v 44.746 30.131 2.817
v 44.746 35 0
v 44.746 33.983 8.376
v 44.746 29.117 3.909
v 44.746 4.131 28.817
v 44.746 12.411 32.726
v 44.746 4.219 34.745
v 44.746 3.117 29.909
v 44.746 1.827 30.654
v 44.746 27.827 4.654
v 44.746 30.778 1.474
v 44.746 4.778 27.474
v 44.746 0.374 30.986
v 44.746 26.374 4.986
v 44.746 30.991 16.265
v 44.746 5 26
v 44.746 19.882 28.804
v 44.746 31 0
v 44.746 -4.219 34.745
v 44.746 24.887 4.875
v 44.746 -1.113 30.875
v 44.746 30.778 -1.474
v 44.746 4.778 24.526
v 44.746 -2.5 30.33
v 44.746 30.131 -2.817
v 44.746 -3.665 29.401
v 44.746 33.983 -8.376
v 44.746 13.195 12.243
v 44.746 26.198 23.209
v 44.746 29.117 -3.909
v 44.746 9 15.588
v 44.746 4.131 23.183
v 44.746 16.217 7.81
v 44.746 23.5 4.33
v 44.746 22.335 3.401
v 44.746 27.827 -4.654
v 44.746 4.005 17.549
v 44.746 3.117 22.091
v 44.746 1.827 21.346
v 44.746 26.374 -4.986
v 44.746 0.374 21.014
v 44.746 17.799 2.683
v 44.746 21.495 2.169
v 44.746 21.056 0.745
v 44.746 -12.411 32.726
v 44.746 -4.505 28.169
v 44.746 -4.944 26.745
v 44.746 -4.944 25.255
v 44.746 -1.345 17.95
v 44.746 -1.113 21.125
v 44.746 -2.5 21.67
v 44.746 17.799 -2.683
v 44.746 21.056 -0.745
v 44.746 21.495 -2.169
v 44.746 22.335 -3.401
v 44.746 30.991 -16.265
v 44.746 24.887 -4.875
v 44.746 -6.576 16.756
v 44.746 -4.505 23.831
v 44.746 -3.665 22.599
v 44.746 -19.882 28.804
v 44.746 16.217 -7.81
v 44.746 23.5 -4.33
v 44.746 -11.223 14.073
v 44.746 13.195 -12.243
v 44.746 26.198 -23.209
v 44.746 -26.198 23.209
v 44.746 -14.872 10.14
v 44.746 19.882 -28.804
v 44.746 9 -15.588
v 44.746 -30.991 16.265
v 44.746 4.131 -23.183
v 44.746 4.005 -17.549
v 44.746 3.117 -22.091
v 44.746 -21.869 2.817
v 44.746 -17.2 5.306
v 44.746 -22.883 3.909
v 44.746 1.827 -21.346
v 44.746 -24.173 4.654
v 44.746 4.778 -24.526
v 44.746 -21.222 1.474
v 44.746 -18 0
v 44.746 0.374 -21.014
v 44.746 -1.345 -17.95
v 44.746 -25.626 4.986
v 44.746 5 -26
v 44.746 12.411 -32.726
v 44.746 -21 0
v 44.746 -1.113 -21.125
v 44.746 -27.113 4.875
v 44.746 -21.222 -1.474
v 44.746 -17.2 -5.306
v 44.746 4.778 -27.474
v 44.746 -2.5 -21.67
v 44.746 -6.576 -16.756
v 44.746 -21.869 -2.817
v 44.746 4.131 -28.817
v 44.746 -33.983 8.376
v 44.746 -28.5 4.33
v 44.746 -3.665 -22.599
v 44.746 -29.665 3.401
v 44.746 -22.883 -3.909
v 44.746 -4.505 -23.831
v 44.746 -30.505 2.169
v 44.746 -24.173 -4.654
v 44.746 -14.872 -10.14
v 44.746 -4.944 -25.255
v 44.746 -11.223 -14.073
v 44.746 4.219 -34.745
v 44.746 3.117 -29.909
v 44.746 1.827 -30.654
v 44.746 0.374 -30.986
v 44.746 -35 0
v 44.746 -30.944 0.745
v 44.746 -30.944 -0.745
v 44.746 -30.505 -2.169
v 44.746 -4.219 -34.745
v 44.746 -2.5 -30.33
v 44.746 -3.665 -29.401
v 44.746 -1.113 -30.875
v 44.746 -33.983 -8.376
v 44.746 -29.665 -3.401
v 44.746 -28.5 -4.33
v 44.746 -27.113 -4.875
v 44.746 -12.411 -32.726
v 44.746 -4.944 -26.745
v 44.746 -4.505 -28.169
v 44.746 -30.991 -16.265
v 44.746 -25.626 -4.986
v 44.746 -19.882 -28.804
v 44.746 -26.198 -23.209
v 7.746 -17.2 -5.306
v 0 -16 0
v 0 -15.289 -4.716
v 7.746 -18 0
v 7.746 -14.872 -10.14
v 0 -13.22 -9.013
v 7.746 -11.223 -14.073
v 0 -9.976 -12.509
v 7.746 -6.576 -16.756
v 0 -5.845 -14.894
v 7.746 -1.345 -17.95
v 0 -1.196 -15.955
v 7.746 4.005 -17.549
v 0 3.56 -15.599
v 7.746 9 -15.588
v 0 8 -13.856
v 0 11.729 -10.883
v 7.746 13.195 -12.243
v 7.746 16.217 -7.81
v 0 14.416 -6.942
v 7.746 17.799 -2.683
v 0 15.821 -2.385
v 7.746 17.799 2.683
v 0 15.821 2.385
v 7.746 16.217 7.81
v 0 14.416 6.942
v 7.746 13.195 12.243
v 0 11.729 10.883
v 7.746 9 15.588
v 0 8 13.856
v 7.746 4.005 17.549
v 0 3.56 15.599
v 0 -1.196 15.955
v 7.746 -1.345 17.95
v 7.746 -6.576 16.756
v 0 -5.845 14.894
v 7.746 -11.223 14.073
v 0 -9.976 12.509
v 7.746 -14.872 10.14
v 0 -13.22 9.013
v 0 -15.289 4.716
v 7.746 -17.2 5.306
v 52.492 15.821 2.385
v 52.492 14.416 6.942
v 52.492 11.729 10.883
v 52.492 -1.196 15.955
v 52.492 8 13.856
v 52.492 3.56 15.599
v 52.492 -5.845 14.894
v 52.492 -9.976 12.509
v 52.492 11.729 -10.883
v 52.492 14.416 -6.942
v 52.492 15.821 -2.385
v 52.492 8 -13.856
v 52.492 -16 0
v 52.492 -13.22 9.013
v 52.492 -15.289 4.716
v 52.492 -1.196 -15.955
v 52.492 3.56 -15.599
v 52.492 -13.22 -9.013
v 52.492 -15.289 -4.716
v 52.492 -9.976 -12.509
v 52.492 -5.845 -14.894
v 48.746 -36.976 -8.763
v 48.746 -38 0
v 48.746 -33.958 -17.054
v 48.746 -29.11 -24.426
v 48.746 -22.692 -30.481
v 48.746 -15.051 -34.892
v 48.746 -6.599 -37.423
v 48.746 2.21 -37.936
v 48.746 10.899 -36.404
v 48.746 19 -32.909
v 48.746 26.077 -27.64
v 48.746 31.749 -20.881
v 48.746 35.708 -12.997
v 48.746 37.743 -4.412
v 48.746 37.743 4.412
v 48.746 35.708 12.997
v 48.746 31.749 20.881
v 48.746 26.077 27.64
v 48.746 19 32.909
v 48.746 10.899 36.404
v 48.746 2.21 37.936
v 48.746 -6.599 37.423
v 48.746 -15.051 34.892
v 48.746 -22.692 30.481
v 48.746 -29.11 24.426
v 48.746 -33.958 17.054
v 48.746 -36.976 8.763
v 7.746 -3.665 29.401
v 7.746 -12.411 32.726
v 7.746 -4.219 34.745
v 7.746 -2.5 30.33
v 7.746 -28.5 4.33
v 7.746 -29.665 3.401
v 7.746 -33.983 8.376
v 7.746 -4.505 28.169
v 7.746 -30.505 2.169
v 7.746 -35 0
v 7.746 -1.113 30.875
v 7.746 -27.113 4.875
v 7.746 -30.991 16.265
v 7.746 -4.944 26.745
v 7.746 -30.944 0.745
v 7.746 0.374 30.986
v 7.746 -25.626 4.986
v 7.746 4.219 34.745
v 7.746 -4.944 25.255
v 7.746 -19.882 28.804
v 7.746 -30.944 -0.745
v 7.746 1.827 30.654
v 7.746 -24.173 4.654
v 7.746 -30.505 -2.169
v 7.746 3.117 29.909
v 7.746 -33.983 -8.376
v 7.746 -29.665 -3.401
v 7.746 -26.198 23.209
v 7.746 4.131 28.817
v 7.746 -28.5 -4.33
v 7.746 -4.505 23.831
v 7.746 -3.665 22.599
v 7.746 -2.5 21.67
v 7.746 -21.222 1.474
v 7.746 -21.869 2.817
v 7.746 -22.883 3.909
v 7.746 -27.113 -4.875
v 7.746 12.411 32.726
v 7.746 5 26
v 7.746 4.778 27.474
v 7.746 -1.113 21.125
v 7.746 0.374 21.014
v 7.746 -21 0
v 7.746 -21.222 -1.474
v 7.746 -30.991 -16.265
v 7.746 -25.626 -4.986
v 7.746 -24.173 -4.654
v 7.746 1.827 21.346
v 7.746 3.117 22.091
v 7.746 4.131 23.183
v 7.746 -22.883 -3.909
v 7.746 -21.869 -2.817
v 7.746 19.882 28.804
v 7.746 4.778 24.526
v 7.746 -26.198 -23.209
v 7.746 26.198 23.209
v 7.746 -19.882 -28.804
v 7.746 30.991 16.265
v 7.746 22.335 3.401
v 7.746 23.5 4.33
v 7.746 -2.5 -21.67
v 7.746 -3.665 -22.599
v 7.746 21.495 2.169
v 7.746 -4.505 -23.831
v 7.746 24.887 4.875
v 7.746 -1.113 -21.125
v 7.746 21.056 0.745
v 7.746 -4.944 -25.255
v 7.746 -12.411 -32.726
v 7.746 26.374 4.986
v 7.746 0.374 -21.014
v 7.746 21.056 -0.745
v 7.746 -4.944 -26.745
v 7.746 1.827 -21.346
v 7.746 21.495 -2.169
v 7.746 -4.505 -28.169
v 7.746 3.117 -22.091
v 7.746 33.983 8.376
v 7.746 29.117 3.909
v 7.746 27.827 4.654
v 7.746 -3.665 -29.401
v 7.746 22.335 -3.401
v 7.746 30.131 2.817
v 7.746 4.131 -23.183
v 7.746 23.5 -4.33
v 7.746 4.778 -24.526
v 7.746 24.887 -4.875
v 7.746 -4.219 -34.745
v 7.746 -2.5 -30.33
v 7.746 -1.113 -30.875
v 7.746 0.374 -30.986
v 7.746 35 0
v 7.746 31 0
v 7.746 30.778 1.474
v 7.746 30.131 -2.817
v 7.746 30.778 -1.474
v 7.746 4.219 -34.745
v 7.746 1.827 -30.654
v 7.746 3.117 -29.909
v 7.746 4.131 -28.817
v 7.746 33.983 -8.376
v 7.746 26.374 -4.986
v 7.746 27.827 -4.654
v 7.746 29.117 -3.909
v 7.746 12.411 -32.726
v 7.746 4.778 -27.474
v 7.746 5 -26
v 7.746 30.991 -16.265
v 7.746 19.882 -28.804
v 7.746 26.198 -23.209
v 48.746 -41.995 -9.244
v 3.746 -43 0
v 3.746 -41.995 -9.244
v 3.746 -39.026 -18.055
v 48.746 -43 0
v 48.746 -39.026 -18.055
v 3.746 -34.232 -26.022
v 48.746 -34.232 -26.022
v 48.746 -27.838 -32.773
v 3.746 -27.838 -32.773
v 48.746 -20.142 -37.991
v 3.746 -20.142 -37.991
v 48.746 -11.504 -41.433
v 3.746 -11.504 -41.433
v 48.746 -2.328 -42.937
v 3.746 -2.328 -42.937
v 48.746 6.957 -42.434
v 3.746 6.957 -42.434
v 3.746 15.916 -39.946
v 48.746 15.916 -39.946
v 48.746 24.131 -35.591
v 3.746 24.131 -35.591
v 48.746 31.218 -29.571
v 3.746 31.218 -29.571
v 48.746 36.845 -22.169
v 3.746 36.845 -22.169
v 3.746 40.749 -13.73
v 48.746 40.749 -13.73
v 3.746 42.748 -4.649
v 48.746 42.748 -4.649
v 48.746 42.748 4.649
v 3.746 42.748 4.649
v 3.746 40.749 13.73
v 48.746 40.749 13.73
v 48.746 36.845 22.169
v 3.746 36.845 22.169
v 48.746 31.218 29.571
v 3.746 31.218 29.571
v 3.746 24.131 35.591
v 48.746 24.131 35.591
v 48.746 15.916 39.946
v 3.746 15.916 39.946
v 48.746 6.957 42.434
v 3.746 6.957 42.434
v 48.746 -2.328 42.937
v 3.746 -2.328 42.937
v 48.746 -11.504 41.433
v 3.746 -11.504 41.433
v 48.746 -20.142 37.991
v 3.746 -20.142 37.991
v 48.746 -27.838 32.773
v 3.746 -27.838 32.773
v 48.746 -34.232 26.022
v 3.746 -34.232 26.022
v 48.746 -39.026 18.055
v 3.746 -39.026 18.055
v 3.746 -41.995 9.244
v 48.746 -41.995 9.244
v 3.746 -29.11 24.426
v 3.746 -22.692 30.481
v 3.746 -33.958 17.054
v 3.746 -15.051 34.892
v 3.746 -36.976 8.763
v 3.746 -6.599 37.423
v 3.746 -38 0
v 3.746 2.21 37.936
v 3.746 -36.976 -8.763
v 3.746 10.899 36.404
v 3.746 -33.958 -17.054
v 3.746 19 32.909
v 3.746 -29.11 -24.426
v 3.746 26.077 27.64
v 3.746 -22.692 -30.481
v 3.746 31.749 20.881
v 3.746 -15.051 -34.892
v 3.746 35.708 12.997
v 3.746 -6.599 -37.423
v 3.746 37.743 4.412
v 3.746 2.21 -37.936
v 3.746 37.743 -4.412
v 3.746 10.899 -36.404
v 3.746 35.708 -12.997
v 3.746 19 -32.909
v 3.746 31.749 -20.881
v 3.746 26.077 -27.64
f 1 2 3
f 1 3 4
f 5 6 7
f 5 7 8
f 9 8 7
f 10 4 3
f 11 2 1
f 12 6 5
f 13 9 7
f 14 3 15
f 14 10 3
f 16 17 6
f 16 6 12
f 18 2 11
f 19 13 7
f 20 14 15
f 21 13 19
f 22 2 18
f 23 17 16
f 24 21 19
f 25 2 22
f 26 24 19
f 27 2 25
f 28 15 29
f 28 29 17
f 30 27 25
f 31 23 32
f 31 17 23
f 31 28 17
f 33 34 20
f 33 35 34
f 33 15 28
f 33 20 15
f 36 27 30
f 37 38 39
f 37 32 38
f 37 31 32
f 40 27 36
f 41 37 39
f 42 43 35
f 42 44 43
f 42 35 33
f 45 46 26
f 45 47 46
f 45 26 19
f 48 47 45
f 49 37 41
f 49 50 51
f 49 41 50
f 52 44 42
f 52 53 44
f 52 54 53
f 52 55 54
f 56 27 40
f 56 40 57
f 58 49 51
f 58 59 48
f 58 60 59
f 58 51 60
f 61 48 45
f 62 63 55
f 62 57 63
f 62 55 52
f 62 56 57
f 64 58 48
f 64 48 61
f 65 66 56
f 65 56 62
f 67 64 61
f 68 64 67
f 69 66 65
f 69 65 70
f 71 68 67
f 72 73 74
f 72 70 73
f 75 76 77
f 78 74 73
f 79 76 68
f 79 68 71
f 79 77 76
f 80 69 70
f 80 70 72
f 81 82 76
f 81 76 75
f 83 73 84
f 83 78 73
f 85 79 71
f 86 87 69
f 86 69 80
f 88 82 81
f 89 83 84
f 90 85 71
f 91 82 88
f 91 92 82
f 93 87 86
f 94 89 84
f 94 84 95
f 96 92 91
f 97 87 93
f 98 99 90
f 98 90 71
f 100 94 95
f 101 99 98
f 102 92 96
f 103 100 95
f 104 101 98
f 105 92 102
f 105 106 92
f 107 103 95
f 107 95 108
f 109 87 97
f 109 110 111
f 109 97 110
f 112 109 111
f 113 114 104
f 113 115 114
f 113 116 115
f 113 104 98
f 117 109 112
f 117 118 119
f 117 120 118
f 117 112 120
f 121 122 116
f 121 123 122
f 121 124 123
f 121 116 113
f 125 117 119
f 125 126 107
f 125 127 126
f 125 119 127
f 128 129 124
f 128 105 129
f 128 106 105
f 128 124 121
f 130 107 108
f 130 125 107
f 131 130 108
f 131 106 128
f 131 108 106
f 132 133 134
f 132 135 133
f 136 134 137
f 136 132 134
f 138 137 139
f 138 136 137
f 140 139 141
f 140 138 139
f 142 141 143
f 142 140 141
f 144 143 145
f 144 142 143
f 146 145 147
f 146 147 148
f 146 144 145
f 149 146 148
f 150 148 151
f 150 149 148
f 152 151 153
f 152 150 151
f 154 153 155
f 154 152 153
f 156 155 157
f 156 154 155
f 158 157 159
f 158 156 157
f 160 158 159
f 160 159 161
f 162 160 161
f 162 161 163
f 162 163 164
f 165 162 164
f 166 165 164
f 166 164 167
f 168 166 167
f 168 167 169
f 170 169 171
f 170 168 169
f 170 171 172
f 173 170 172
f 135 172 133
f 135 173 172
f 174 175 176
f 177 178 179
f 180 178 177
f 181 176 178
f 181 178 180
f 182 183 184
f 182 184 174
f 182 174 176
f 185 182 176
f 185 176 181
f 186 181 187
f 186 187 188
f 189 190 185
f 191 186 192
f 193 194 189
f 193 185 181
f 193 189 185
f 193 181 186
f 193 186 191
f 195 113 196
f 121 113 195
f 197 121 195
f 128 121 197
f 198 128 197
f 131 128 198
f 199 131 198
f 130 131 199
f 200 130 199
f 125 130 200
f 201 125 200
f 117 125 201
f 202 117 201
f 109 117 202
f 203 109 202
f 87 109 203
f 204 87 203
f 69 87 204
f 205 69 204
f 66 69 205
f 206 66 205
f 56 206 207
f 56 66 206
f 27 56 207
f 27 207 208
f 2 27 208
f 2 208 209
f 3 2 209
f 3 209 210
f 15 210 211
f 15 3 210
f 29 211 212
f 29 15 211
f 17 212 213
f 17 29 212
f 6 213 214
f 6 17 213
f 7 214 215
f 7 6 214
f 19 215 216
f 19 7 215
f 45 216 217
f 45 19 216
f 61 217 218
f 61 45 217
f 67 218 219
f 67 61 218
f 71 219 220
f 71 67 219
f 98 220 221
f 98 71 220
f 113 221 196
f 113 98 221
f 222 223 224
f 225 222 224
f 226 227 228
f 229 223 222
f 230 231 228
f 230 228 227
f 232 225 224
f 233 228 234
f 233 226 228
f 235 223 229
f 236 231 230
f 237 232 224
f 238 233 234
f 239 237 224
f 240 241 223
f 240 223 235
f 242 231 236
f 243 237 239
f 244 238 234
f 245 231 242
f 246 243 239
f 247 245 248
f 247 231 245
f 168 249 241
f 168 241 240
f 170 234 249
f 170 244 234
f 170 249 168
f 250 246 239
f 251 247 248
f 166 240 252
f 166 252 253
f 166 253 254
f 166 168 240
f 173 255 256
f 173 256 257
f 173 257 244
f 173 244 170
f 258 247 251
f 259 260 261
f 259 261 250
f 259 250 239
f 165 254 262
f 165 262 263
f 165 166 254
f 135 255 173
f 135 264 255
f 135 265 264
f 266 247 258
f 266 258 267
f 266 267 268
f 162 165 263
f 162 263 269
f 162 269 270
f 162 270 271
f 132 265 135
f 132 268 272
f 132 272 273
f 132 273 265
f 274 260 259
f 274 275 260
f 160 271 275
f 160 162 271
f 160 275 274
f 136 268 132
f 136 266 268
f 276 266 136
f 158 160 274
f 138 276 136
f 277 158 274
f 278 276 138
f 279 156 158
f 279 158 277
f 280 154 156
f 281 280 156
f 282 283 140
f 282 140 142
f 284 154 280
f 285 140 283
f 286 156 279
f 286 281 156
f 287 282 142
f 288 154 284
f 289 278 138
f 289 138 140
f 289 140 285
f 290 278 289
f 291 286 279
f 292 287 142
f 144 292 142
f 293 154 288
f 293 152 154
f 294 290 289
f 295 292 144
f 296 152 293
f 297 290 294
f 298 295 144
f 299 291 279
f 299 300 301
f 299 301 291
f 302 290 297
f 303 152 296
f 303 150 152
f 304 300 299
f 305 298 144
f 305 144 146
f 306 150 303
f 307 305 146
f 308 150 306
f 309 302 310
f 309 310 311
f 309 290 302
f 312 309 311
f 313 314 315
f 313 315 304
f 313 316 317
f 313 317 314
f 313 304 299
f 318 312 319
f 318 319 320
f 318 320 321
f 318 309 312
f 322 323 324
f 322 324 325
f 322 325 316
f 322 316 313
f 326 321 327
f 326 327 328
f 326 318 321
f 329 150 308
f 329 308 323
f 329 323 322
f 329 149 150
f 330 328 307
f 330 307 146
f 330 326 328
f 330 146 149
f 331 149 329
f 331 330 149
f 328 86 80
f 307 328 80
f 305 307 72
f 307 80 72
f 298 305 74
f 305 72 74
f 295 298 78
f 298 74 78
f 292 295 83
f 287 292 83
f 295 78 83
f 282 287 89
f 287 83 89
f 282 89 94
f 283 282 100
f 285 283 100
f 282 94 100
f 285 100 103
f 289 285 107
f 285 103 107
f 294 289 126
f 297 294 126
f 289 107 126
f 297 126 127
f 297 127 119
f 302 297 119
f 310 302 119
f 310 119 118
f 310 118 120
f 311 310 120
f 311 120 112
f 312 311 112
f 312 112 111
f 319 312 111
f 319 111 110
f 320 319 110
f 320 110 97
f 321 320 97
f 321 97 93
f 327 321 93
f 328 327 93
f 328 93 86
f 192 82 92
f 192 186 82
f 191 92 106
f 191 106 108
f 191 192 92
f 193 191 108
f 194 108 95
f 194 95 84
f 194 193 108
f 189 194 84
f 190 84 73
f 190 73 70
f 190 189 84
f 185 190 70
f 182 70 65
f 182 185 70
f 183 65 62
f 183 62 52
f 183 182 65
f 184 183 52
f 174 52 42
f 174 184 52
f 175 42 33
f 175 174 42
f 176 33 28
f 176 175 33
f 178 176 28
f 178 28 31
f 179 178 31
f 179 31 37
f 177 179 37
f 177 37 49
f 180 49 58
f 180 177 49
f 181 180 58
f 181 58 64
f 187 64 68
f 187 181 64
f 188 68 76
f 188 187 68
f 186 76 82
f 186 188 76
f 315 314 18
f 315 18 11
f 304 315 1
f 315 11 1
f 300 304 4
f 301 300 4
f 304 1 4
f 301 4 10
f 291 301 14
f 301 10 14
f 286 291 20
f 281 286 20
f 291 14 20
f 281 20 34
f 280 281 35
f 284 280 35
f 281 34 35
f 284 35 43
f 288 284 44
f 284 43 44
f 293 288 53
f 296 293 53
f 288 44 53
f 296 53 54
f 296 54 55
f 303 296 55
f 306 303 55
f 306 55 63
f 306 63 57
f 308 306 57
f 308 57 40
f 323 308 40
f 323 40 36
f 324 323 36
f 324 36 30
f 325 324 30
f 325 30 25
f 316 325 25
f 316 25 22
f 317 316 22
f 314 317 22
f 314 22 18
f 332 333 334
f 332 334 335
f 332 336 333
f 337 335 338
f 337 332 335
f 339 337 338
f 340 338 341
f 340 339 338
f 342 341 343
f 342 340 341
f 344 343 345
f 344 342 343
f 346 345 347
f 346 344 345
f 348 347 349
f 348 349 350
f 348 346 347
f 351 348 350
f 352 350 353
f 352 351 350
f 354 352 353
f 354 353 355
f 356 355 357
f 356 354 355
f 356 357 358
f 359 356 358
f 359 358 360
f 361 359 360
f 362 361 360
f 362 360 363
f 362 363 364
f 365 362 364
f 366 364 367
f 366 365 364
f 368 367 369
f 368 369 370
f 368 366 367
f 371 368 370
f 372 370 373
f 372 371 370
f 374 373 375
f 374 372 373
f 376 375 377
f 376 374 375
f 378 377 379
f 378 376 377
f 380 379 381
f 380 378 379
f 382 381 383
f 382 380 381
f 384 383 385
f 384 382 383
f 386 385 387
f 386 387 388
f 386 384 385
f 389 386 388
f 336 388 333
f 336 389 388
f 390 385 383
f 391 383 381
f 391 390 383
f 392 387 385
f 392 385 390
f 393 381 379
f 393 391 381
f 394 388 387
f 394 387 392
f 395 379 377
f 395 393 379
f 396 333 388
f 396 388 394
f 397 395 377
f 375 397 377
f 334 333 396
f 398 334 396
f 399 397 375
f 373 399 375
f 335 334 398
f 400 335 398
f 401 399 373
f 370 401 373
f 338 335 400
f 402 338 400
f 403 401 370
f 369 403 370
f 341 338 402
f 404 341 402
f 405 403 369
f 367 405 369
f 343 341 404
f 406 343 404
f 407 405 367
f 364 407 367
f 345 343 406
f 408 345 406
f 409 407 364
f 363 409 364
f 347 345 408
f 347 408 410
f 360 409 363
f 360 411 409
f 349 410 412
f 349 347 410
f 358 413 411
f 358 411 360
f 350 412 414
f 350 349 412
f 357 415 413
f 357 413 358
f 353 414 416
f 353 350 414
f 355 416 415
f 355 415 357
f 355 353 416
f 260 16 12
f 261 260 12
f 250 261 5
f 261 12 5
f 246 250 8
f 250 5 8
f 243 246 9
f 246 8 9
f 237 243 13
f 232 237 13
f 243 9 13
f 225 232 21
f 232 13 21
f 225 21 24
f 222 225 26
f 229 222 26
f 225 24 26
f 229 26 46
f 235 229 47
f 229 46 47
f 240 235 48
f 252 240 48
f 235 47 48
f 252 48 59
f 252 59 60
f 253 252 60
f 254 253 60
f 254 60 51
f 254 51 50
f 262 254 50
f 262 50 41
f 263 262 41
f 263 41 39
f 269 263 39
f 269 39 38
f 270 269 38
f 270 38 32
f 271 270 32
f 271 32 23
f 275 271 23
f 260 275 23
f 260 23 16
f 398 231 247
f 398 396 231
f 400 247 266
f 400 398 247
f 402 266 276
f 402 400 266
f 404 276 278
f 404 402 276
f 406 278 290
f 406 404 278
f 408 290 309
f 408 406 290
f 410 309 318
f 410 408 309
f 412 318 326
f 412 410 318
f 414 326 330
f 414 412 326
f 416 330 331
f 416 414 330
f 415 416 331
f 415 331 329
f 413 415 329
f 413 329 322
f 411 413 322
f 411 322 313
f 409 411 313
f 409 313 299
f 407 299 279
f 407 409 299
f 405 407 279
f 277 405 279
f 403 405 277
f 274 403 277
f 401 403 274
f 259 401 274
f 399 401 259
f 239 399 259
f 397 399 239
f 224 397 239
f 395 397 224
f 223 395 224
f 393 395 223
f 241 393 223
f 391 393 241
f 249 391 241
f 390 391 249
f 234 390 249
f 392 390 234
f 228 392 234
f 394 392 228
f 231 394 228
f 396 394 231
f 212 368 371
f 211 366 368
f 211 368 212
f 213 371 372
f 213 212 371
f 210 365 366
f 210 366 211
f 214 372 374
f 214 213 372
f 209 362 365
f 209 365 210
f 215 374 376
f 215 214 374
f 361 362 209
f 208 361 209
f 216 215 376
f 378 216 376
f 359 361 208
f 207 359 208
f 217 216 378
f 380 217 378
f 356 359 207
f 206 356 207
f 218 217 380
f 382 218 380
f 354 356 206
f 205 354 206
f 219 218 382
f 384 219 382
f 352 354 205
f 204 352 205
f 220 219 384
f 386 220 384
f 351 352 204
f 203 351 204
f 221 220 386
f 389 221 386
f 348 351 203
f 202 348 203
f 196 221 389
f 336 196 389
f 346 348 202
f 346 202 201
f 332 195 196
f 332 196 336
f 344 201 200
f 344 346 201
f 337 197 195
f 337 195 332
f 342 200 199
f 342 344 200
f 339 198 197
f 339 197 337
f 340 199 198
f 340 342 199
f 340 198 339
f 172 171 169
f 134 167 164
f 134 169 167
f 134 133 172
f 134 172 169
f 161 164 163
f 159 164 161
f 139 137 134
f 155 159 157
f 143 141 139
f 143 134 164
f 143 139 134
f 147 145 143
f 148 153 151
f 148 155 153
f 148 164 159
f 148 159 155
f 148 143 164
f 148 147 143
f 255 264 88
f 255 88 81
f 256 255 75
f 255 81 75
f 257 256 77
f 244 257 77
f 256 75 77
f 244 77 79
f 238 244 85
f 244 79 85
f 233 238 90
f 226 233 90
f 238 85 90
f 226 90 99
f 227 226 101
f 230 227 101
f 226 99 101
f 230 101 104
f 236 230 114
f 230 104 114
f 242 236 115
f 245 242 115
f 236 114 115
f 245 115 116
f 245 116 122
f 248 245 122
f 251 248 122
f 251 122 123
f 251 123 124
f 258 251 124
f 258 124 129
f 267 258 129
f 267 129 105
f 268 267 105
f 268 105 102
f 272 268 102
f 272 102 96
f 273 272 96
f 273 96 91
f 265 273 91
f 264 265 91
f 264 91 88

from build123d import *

# Parameters (mm, degrees)
SKETCH2_R          = 5
CUT_EXTRUDE2_DEPTH = 50


with BuildPart() as part:
    # Sketch1 → Revolve1 (revolve)
    with BuildSketch(Plane.XY, mode=Mode.PRIVATE) as revolve1_sk:
        Polygon((0, 0), (0, 16), (7.745966692, 18), (7.745966692, 35), (3.745966692, 38), (3.745966692, 43), (48.745966692, 43), (48.745966692, 38), (44.745966692, 35), (44.745966692, 18), (52.491933385, 16), (52.491933385, 0), align=None)
    revolve(revolve1_sk.sketch.rotate(Axis((0, 0, 0), (1, 0, 0)), 180), axis=Axis((0, 0, 0), (1, 0, 0)))

    # Sketch2 → Cut-Extrude2 (cut)
    with BuildSketch(Plane(origin=(52.491933385, 0, 0), x_dir=(0, 0, -1), z_dir=(1, 0, 0))):
        with Locations(Location((0, 26, 0), (0, 0, 90))):
            Circle(SKETCH2_R)
        with Locations(Location((26, 0, 0), (0, 0, 90))):
            Circle(SKETCH2_R)
        with Locations(Location((0, -26, 0), (0, 0, 90))):
            Circle(SKETCH2_R)
        with Locations(Location((-26, 0, 0), (0, 0, 90))):
            Circle(SKETCH2_R)
    extrude(amount=-CUT_EXTRUDE2_DEPTH, mode=Mode.SUBTRACT)


solid = part.part
